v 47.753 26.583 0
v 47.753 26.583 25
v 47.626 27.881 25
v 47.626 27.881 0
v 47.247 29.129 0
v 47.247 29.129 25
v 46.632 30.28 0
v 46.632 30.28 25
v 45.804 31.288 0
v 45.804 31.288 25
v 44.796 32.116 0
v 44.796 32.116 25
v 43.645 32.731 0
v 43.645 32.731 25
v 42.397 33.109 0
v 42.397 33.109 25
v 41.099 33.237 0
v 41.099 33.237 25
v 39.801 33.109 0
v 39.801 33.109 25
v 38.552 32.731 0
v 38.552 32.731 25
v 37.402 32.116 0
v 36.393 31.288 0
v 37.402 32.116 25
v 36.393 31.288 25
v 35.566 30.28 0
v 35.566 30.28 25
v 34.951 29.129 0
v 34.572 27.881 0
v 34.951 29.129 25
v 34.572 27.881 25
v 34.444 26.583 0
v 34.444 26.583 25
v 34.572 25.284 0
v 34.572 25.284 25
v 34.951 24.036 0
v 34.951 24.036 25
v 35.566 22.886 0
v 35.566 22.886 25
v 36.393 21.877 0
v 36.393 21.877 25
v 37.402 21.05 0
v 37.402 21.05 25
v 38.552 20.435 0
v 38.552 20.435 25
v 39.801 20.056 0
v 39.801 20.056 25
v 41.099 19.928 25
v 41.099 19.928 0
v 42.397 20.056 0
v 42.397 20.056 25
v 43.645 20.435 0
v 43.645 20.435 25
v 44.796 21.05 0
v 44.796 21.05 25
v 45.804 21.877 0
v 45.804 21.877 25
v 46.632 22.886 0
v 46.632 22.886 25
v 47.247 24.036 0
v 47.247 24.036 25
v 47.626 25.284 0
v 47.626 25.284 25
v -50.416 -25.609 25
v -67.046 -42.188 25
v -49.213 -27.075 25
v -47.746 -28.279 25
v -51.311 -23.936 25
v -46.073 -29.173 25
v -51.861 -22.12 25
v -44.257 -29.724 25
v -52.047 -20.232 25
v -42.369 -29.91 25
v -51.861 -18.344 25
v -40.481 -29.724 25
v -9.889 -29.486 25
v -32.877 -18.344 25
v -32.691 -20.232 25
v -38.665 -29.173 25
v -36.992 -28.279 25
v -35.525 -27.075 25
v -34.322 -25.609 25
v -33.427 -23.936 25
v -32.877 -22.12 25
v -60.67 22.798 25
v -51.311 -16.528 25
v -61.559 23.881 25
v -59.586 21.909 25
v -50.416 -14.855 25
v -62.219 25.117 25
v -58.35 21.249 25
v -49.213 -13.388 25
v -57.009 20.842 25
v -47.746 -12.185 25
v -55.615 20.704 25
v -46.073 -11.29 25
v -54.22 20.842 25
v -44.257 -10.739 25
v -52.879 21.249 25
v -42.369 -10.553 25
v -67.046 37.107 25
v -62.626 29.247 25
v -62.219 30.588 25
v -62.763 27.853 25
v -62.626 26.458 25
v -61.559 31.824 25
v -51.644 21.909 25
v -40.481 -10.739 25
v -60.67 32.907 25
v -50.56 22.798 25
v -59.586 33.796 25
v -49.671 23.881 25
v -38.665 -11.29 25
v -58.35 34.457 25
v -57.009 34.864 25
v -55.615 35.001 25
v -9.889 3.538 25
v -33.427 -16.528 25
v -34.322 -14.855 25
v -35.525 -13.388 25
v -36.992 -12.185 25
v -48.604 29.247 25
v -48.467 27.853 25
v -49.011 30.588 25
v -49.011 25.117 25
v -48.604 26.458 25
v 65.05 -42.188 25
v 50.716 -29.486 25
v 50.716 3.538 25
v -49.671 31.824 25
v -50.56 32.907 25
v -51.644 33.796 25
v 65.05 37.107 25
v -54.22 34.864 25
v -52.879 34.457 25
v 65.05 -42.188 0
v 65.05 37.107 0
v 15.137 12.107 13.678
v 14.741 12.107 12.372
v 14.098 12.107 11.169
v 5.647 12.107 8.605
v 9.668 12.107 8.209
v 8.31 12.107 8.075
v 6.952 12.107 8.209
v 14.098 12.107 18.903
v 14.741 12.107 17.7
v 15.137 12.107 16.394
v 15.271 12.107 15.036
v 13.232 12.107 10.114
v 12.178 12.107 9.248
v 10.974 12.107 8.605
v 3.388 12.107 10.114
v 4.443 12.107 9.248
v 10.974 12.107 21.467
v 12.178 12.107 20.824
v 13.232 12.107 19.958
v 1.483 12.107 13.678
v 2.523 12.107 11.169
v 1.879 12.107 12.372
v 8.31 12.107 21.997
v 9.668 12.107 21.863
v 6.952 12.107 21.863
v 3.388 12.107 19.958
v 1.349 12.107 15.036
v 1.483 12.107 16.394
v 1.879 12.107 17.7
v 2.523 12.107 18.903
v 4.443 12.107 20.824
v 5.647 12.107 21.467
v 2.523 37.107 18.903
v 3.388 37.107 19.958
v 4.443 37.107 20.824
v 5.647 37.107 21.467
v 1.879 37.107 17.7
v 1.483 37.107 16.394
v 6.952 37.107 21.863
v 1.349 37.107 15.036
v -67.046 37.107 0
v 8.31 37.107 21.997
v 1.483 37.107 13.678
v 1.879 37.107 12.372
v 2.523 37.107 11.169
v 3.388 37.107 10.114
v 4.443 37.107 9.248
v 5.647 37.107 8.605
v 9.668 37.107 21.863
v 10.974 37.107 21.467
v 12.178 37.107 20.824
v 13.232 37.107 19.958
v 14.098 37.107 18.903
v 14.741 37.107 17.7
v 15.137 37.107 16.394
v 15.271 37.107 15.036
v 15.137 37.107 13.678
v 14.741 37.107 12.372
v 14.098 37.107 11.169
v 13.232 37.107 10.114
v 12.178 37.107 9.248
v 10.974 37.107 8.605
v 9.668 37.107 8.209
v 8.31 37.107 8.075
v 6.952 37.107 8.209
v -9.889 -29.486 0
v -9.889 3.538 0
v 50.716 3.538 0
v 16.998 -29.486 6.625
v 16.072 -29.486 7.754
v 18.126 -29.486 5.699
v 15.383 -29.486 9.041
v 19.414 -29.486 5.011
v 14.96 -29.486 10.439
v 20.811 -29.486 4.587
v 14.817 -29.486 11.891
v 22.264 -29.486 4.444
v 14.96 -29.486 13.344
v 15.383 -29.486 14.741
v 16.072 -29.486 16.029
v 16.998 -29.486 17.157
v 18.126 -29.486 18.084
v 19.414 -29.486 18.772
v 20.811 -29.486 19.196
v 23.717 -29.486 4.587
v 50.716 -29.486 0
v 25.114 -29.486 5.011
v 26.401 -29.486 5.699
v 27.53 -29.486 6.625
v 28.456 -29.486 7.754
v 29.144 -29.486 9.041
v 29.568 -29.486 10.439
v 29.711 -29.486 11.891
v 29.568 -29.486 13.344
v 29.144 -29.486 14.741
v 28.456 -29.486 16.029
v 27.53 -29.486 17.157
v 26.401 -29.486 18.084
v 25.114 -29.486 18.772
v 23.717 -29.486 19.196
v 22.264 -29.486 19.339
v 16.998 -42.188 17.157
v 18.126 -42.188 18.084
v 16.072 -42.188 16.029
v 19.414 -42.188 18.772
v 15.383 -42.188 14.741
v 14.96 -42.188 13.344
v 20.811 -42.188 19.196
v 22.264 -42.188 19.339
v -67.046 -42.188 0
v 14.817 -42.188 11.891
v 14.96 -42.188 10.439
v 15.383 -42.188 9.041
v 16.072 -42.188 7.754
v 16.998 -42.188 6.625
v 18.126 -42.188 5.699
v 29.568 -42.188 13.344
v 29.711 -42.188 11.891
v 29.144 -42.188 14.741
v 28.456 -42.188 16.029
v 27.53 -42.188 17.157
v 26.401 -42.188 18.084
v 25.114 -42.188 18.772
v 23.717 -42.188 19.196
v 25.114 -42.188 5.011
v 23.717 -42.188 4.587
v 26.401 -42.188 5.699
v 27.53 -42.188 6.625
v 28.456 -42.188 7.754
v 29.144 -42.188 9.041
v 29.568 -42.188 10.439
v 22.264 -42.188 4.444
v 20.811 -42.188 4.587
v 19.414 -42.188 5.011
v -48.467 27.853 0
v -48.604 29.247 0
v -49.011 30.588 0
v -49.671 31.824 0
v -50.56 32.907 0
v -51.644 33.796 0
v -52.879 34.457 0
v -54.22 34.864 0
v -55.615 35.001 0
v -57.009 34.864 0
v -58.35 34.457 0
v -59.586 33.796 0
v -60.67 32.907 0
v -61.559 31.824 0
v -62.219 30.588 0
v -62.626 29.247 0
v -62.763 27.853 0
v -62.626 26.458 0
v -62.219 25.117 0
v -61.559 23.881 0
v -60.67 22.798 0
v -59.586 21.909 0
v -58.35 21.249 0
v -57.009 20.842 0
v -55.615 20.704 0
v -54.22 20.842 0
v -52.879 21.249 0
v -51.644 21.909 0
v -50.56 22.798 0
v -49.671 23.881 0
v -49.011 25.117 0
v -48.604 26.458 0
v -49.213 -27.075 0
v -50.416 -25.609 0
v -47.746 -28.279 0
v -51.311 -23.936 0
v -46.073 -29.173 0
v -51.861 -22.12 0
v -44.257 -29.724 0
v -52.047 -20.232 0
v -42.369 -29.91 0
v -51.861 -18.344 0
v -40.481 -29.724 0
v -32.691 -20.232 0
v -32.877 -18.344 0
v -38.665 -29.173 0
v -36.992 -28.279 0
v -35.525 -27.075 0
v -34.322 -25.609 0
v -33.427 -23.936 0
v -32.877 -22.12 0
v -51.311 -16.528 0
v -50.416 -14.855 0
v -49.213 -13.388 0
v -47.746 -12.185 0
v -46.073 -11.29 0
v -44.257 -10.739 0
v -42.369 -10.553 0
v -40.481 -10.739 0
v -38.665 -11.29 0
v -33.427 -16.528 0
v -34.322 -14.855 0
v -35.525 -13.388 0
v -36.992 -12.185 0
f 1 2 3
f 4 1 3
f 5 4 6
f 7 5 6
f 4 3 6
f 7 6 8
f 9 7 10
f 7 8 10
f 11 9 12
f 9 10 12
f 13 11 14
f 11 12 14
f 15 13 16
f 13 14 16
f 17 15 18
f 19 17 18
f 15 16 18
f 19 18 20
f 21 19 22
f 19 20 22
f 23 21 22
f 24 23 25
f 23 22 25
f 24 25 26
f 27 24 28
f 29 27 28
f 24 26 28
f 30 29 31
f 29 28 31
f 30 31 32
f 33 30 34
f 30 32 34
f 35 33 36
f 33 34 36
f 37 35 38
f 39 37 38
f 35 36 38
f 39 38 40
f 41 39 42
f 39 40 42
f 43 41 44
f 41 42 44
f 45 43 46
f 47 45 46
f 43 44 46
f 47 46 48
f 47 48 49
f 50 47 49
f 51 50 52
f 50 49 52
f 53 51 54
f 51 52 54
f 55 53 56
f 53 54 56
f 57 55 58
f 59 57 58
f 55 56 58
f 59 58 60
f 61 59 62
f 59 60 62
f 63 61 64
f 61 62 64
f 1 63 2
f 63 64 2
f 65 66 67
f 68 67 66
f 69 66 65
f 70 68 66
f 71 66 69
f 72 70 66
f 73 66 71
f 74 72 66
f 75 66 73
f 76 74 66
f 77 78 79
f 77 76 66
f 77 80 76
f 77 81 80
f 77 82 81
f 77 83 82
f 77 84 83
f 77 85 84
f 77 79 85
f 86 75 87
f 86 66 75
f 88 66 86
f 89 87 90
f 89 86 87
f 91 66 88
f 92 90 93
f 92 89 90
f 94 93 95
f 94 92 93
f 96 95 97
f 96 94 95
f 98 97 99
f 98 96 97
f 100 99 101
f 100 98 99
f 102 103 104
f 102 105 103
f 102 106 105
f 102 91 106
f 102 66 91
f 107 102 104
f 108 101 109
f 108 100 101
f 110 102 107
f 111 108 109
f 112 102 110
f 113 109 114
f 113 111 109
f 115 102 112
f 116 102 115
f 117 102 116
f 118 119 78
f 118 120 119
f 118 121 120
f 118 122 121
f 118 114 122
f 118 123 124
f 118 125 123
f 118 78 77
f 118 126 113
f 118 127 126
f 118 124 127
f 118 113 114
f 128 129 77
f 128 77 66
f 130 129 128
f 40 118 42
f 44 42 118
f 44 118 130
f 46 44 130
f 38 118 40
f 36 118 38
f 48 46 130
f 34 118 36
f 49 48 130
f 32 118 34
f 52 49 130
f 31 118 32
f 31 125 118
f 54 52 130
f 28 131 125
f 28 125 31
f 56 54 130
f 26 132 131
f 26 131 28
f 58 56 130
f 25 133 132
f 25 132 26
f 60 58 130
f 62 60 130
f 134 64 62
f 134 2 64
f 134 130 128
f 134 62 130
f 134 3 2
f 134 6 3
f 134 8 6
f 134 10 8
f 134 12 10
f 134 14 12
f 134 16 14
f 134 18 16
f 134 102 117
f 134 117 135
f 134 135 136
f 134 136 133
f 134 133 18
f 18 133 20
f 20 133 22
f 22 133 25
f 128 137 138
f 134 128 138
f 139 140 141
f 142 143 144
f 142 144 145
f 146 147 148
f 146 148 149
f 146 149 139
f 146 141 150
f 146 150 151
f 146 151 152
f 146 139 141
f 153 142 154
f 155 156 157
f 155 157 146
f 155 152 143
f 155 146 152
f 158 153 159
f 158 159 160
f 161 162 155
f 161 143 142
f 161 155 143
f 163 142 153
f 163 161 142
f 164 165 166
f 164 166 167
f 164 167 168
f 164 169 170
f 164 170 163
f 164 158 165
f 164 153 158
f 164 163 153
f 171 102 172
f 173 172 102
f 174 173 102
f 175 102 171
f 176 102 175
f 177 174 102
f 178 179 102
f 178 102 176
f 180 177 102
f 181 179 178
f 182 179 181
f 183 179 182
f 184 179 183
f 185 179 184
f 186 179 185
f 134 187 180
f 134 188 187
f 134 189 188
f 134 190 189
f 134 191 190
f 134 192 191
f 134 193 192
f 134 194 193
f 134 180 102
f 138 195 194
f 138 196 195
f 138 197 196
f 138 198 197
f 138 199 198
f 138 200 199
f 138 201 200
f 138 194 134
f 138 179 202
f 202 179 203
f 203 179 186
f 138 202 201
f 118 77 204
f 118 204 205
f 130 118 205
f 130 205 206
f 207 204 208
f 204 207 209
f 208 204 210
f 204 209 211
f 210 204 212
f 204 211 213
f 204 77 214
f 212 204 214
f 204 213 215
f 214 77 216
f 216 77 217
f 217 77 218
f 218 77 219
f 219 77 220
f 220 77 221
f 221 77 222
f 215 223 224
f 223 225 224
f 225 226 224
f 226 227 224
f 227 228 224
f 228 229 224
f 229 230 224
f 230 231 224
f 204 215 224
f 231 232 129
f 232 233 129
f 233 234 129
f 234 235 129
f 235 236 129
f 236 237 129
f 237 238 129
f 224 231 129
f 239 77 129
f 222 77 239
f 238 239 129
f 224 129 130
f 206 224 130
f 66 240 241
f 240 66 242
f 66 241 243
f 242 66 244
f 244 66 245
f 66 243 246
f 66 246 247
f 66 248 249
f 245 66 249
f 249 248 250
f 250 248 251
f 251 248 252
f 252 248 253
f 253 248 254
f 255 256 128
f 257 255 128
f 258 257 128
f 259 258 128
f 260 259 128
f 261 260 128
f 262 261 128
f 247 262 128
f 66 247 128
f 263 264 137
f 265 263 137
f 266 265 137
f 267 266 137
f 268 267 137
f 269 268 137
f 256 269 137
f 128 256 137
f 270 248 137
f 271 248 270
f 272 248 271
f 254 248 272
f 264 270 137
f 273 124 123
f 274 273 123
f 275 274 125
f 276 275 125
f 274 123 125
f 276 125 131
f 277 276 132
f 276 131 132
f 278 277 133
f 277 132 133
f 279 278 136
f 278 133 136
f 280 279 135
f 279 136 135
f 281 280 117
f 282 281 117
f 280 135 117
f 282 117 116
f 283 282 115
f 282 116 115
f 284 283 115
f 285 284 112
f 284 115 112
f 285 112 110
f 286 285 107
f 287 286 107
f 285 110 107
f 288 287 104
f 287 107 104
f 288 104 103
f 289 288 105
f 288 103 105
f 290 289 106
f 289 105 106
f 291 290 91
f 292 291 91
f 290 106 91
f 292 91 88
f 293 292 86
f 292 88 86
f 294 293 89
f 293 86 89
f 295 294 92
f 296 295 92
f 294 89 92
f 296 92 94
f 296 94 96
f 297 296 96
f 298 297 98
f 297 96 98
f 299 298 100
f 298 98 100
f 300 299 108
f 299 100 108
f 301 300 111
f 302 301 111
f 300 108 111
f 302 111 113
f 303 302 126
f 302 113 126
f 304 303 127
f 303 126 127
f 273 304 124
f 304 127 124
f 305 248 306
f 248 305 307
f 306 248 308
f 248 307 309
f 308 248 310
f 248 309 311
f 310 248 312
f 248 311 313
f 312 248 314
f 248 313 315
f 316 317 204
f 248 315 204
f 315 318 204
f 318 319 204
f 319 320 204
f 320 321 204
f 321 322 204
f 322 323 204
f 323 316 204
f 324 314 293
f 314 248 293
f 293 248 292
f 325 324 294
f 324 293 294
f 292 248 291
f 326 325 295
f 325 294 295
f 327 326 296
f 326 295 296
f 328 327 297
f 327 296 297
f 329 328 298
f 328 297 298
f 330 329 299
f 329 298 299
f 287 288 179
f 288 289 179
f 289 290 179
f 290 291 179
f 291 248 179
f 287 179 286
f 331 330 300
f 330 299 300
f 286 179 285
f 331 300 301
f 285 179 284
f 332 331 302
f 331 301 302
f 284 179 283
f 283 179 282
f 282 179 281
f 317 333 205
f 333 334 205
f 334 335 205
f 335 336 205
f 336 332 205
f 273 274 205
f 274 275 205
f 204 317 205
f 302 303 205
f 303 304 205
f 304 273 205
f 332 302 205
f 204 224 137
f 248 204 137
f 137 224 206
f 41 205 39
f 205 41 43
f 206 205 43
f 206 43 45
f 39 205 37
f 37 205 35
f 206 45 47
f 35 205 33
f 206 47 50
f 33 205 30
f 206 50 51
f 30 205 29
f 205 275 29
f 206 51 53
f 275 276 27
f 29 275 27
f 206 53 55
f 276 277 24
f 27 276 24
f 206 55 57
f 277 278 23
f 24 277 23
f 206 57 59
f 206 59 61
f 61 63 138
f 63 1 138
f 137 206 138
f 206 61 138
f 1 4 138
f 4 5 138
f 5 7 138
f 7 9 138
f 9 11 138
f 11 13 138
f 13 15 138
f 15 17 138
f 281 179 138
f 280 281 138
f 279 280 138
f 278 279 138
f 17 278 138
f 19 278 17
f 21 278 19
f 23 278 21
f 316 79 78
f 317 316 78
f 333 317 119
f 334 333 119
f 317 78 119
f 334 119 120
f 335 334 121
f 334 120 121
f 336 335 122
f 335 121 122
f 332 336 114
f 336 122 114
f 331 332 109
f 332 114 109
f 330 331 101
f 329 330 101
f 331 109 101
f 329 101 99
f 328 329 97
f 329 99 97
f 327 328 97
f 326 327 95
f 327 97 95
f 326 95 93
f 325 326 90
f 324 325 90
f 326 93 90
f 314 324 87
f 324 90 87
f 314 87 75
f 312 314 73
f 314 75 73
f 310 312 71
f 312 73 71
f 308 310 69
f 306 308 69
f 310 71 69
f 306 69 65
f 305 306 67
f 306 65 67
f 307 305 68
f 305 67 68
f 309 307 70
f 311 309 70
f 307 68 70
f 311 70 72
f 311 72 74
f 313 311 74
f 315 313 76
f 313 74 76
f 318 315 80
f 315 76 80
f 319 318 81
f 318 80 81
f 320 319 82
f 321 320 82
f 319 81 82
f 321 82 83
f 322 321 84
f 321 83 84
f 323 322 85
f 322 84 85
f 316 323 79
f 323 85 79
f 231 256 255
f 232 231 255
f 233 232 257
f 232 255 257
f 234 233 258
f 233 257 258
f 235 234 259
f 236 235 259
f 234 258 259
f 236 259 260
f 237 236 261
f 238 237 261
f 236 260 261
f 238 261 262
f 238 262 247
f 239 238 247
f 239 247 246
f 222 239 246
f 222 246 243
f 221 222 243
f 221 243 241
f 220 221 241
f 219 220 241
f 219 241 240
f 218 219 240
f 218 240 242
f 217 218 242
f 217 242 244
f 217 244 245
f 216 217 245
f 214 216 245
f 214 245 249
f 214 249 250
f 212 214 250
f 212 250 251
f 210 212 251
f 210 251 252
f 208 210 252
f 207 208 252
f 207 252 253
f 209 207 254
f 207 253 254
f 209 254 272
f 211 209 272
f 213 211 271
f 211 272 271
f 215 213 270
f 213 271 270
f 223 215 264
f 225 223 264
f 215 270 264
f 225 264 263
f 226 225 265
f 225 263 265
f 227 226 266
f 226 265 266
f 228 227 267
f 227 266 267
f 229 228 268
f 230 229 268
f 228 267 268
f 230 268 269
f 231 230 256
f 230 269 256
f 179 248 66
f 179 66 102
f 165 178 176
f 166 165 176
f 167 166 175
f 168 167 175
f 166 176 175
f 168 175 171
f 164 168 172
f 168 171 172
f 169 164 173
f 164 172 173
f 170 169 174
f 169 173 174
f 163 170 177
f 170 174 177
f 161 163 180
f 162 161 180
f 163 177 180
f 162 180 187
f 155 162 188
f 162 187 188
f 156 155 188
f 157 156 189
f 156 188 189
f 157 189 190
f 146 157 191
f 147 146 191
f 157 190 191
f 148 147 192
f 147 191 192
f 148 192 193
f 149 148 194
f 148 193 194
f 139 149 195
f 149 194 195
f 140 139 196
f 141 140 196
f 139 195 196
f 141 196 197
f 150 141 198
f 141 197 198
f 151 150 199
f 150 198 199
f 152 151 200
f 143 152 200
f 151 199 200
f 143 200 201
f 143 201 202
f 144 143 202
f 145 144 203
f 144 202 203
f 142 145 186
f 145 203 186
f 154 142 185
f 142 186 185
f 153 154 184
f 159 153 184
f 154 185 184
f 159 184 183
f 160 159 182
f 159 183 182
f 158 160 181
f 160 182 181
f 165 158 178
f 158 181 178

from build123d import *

# Parameters (mm, degrees)
F0_W     = 132.096782
F0_H     = 79.294358
F1_DEPTH = 25
F2_R     = 7.148366
F2_R_2   = 9.678364
F3_DEPTH = 25
F2_R_3   = 6.654601
F2_W     = 60.604844
F2_H     = 33.024194
F4_DEPTH = 25
F5_R     = 7.447322
F6_DEPTH = 25
F7_R     = 6.960859
F8_DEPTH = 25


with BuildPart() as f1:
    # F0 (on Top) → F1 (new body)
    with BuildSketch(Plane.XY):
        with Locations((-0.997983, -2.540322)):
            Rectangle(F0_W, F0_H)
    extrude(amount=F1_DEPTH)

    # F2 (on face) → F3 (cut)
    with BuildSketch(Plane.XY.offset(25)):
        with Locations((-55.614922, 27.852824)):
            Circle(F2_R)
        with Locations((-42.368952, -20.231856)):
            Circle(F2_R_2)
    extrude(amount=-F3_DEPTH, mode=Mode.SUBTRACT)

    # F2 (on face) → F4 (cut)
    with BuildSketch(Plane.XY.offset(25)):
        with Locations((-55.614922, 27.852824)):
            Circle(F2_R)
        with Locations((-42.368952, -20.231856)):
            Circle(F2_R_2)
        with Locations((41.098792, 26.582664)):
            Circle(F2_R_3)
        with Locations((20.413308, -12.97379)):
            Rectangle(F2_W, F2_H)
    extrude(amount=-F4_DEPTH, mode=Mode.SUBTRACT)

    # F5 (on face) → F6 (cut)
    with BuildSketch(Plane.XZ.offset(42.187501)):
        with Locations((22.263901, 11.891413)):
            Circle(F5_R)
    extrude(amount=-F6_DEPTH, mode=Mode.SUBTRACT)

    # F7 (on face) → F8 (cut)
    with BuildSketch(Plane(origin=(0, 37.106857, 0), x_dir=(-1, 0, 0), z_dir=(0, 1, 0))):
        with Locations((-8.310321, 15.035793)):
            Circle(F7_R)
    extrude(amount=-F8_DEPTH, mode=Mode.SUBTRACT)


solid = f1.part
